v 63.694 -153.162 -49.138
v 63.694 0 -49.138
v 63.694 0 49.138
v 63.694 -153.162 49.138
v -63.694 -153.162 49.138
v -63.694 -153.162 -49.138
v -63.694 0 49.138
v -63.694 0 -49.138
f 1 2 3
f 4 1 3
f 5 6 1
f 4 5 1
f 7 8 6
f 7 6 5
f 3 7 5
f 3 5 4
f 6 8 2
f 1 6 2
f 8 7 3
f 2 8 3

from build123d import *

# Parameters (mm, degrees)
F0_R      = 25.079521
F1_DEPTH  = 127
F0_W      = 127.388418
F0_H      = 98.275594
F2_DEPTH  = 25.4
F3_R      = 5.08
F2_FACE_W = 127.388418
F2_FACE_H = 98.275594
F4_DEPTH  = 153.162


with BuildPart() as f1:
    # F0 (on Front) → F1 (new body)
    with BuildSketch(Plane.XZ):
        Circle(F0_R)
    extrude(amount=F1_DEPTH)

    # F0 (on Front) → F2 (join)
    with BuildSketch(Plane.XZ):
        Rectangle(F0_W, F0_H)
        Circle(F0_R, mode=Mode.SUBTRACT)
    extrude(amount=F2_DEPTH)

    # F3
    f3_edges = [f1.edges().sort_by_distance(p)[0] for p in [
        (-25.079521, -25.4, 0),
        (-25.079521, -127, 0),
    ]]
    fillet(f3_edges, radius=F3_R)

    # F2_face (on face) → F4 (join)
    with BuildSketch(Plane(origin=(0, 0, 0), x_dir=(1, 0, 0), z_dir=(0, 1, 0))):
        Rectangle(F2_FACE_W, F2_FACE_H)
    extrude(amount=-F4_DEPTH)


solid = f1.part
